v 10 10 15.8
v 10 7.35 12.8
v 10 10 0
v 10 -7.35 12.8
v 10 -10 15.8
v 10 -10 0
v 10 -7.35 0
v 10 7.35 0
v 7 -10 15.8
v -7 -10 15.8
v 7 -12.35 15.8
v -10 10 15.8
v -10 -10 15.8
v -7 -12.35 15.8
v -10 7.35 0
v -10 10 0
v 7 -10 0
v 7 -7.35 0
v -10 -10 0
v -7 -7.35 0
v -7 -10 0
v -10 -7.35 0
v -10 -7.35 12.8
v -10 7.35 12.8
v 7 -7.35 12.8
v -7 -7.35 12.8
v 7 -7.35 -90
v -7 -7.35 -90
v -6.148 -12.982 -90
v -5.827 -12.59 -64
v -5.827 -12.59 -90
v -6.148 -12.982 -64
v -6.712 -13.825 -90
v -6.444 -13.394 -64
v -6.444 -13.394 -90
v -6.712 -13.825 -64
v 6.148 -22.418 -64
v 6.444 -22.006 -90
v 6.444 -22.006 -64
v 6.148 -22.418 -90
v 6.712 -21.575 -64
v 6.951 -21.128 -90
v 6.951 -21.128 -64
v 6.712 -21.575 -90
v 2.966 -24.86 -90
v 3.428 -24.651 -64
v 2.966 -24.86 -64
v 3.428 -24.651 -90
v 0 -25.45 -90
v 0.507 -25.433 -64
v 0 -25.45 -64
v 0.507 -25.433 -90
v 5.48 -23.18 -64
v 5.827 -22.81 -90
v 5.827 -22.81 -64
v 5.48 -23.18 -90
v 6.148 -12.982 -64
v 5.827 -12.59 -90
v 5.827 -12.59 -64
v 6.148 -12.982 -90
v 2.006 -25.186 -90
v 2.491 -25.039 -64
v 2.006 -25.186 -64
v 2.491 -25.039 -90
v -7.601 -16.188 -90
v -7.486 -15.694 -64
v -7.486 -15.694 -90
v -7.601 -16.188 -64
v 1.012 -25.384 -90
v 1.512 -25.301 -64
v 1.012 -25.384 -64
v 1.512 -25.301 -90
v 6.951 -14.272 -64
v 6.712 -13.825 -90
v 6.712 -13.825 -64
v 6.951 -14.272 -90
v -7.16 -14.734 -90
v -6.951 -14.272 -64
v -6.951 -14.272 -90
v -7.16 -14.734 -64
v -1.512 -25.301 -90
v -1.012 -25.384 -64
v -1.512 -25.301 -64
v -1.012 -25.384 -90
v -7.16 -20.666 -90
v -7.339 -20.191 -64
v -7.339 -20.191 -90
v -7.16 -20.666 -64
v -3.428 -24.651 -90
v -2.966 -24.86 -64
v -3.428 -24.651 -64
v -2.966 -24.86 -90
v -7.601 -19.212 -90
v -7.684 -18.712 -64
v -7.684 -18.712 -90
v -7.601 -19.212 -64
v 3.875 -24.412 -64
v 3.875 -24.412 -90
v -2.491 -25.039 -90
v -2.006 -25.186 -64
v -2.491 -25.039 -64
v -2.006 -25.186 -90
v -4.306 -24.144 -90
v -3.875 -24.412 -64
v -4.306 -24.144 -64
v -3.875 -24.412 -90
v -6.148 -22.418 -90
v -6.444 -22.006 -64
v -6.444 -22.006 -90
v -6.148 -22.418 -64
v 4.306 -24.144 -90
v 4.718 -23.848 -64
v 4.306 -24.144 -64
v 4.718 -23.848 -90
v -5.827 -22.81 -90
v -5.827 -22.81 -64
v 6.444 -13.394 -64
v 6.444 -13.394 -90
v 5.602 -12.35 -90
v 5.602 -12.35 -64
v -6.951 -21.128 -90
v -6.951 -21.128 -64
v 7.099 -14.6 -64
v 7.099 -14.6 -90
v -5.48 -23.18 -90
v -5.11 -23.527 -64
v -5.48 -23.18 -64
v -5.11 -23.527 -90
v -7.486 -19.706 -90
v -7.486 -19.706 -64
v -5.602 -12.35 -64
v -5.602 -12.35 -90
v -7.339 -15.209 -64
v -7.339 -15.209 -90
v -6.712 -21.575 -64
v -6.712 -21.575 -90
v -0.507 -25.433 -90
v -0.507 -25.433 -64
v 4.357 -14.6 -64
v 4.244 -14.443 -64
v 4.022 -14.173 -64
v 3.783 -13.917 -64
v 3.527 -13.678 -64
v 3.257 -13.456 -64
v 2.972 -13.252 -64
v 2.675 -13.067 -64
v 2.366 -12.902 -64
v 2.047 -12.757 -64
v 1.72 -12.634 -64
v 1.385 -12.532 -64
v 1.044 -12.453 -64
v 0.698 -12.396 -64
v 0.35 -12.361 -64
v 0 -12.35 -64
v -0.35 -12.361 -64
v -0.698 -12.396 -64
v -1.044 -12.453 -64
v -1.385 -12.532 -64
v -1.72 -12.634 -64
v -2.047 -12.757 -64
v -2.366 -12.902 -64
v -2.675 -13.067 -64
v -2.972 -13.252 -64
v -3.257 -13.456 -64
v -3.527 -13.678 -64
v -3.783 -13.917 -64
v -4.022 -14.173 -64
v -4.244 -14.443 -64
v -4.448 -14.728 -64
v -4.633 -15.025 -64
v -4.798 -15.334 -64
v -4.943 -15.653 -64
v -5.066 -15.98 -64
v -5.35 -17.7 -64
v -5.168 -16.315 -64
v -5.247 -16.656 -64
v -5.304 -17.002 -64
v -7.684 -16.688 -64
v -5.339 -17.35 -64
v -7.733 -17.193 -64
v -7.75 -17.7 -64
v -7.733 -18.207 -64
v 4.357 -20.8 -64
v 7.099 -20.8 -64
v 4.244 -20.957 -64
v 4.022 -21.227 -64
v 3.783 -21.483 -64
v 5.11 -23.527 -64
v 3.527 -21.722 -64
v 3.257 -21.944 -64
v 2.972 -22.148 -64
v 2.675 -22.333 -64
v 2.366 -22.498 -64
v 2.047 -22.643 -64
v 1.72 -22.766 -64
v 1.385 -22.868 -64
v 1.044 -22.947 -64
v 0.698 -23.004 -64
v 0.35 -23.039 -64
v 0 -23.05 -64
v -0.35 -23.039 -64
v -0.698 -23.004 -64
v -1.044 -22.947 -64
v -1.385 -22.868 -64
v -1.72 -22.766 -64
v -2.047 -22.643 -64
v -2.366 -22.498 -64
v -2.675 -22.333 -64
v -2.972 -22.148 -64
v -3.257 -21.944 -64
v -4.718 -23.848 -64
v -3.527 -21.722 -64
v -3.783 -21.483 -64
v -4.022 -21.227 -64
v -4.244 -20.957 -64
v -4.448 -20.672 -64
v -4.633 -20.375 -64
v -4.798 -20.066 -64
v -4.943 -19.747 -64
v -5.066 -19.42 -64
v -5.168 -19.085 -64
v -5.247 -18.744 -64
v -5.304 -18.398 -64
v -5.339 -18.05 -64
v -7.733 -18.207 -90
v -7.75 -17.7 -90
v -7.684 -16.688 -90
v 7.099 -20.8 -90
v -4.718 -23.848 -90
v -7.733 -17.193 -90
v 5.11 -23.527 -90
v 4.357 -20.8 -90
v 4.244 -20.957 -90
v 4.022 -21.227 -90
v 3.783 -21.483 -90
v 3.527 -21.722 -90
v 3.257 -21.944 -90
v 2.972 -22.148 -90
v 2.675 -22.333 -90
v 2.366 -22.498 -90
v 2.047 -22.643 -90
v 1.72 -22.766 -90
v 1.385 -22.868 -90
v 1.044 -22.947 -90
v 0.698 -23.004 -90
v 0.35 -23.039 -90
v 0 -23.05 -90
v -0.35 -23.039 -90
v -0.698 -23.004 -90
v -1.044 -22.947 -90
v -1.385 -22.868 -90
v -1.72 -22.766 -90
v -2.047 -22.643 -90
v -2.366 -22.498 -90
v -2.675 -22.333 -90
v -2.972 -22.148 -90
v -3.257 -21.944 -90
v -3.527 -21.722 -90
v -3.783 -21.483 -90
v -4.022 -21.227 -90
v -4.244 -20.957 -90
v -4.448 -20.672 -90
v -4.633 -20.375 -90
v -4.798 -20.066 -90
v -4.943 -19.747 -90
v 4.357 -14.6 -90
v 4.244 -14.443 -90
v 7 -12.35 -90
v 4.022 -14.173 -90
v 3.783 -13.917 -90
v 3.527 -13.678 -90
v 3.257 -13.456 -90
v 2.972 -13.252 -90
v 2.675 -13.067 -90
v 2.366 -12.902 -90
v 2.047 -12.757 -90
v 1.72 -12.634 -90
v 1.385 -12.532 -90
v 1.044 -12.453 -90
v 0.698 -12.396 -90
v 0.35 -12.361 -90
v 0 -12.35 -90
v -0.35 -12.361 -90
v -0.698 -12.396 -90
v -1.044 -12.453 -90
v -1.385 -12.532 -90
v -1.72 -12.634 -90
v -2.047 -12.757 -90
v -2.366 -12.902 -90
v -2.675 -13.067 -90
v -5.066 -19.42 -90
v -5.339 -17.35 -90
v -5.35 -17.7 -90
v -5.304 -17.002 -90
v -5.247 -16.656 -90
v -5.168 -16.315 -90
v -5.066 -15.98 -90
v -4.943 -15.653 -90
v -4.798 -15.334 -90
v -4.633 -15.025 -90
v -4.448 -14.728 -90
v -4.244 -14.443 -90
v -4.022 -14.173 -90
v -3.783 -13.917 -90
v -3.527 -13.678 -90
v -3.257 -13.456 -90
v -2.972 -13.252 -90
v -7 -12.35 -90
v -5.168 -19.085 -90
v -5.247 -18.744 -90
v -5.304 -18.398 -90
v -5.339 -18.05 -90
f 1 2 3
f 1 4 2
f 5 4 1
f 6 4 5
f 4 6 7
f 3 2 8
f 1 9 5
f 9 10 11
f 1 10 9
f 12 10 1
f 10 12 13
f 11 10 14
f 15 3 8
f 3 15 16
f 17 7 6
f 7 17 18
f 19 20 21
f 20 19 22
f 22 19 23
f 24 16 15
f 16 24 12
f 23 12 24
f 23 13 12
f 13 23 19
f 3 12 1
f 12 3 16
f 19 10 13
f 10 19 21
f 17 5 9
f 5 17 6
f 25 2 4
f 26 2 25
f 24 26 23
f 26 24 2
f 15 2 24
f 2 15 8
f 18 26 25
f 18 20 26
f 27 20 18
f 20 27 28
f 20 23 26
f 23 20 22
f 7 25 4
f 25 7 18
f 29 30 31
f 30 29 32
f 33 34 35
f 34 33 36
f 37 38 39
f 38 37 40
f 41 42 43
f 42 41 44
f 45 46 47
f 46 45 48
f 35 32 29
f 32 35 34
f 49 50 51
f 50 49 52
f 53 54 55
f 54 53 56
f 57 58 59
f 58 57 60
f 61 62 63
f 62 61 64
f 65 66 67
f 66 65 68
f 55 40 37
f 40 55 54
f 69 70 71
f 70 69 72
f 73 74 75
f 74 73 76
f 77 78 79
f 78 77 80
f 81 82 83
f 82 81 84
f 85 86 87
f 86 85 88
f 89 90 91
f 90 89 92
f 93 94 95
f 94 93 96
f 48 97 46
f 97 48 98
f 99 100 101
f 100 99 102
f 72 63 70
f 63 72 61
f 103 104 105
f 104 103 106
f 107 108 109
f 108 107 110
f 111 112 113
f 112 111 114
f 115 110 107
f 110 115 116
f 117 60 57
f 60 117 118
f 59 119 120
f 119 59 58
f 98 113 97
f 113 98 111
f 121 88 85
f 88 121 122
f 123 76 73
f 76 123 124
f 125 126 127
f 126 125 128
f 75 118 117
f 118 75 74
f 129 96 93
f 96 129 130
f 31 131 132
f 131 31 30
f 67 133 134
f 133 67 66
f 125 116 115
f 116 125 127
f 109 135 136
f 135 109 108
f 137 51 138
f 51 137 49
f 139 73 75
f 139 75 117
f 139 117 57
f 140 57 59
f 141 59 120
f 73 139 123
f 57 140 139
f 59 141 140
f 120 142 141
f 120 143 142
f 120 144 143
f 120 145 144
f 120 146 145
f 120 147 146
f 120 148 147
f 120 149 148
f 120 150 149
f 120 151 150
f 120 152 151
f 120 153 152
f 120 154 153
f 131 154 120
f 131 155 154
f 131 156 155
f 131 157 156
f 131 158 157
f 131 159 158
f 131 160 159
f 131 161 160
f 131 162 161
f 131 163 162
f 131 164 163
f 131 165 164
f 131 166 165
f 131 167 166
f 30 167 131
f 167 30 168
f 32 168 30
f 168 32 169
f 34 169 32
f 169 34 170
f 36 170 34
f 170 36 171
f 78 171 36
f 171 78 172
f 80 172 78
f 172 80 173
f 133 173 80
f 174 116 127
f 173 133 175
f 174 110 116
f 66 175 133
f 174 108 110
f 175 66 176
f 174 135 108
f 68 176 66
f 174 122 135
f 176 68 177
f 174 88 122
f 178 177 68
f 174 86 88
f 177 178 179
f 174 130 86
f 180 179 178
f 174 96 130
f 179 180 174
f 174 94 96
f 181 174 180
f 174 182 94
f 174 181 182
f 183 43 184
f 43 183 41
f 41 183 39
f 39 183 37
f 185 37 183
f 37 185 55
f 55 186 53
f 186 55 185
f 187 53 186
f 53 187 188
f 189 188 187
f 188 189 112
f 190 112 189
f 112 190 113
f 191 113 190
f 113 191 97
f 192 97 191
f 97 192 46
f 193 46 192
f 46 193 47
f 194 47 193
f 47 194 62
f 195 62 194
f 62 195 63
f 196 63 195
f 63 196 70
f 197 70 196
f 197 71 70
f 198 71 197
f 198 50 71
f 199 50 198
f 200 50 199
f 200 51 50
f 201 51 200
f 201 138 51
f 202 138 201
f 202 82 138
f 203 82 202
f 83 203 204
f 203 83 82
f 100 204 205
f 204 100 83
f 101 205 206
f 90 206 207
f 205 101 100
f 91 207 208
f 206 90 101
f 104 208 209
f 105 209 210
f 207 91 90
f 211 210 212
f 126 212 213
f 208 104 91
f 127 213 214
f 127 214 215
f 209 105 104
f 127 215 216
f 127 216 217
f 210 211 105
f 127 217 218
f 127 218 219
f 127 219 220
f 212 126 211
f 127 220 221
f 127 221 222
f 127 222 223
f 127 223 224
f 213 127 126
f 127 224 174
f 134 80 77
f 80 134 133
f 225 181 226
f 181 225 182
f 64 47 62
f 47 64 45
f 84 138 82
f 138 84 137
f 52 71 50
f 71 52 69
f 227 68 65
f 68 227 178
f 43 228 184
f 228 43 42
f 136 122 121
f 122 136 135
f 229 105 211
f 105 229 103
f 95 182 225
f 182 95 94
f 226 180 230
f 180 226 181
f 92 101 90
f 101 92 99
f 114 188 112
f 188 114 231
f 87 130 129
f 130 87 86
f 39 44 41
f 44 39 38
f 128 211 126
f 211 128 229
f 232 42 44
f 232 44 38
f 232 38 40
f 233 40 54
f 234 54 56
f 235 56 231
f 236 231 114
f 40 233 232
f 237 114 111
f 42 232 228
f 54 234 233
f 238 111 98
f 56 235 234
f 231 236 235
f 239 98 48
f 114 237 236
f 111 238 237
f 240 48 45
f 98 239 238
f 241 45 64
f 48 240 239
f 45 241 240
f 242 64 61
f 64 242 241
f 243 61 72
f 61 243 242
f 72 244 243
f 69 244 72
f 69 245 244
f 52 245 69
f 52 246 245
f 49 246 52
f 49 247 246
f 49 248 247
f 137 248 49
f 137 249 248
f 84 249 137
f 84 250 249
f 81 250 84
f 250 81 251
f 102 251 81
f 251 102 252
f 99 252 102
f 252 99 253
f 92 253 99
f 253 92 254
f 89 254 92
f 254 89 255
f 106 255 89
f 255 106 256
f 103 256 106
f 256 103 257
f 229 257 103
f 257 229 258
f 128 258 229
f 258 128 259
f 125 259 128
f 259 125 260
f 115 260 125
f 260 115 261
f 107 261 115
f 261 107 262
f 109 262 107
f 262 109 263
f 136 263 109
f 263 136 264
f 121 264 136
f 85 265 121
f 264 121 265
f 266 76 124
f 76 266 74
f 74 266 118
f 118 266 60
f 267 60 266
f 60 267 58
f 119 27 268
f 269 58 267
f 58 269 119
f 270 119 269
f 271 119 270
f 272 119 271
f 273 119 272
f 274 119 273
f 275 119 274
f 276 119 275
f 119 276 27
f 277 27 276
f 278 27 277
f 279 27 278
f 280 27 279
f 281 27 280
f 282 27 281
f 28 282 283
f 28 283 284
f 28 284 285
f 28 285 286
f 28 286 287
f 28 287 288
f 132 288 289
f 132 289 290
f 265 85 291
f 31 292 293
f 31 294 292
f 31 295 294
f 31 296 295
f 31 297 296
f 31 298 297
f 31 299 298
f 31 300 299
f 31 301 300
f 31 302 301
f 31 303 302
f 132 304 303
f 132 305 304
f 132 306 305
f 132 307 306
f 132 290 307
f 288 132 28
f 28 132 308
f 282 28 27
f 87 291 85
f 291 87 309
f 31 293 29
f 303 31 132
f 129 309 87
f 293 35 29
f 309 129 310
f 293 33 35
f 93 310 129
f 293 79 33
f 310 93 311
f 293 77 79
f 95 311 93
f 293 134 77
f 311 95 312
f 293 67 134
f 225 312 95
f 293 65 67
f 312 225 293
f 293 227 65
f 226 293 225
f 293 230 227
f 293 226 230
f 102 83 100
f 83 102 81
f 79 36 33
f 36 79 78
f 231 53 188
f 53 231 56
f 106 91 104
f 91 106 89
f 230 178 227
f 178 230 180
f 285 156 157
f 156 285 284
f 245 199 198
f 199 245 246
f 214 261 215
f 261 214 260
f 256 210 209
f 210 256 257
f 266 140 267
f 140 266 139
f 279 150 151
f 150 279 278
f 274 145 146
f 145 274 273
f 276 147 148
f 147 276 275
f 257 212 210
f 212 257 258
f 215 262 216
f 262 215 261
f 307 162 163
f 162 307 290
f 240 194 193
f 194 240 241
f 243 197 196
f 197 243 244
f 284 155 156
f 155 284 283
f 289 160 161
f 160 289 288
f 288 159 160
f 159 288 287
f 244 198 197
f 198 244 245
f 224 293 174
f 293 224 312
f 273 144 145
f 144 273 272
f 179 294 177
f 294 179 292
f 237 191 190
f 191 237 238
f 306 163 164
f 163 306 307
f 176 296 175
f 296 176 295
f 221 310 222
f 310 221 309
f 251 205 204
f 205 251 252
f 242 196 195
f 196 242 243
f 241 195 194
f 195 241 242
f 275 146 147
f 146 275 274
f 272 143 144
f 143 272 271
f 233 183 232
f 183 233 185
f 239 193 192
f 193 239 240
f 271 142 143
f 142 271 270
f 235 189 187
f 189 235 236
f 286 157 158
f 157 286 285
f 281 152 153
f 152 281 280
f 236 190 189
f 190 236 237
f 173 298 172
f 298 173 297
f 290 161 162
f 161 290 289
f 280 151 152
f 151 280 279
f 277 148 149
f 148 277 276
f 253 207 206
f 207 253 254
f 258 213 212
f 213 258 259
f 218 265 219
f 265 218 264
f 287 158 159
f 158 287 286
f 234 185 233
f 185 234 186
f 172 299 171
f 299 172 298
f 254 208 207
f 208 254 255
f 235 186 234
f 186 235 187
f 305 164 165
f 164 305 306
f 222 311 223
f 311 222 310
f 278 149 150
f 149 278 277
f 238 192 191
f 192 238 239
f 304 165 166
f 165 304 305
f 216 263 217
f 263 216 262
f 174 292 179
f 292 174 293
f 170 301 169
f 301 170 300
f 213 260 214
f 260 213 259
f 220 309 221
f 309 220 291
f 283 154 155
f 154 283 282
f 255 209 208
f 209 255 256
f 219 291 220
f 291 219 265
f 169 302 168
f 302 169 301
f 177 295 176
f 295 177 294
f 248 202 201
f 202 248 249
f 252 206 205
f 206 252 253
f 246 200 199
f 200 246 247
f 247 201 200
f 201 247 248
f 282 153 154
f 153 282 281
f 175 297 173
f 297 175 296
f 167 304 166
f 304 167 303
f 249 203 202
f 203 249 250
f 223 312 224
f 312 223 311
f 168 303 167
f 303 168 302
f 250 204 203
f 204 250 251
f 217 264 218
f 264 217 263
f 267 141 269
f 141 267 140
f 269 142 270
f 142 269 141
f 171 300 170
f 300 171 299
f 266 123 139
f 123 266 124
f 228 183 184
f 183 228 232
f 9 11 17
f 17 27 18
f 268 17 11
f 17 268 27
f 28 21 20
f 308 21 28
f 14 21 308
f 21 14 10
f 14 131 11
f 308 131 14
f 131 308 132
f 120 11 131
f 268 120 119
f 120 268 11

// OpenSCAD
// file: common.scad
// common.scad — shared parameters for the aquarium grow-box parts.
// Everything downstream is driven from here. Measure YOUR tank, fan and lid
// with calipers and edit this file; do not trust the defaults.

$fn = 96;

/* ---------------- measured inputs ---------------- */
glass_t  = 6;      // tank wall glass thickness. 20-long / 29 gal is usually 5-6 mm.
rim_w    = 14;     // width of the plastic top trim, front to back
rim_h    = 16;     // height of the plastic top trim
lid_t    = 3;      // lid sheet thickness. 3 mm polycarbonate is the default.
duct_nom = 101.6;  // 4 in duct. Use 152.4 for a 6 in fan.
probe_d  = 10;     // sensor-probe body diameter
cable_d  = 6;      // fattest cable that must pass through the lid

/* ---------------- print fit ---------------- */
slop = 0.35;  // clearance per side on sliding fits
wall = 3;     // default wall thickness
eps  = 0.01;  // z-fighting guard

/* ---------------- helpers ---------------- */

// A ring of clearance holes, drilled from z=0 upward.
module bolt_ring(count, radius, hole_d, depth) {
    for (i = [0 : count - 1])
        rotate([0, 0, i * 360 / count])
            translate([radius, 0, -eps])
                cylinder(d = hole_d, h = depth + 2 * eps);
}

// Rounded rectangular plate centred on the origin, sitting on z=0.
module rounded_plate(x, y, z, r = 4) {
    hull()
        for (dx = [-1, 1], dy = [-1, 1])
            translate([dx * (x / 2 - r), dy * (y / 2 - r), 0])
                cylinder(r = r, h = z);
}

// Four corner clearance holes inset from the edges of an x by y plate.
module corner_holes(x, y, inset, hole_d, depth) {
    for (dx = [-1, 1], dy = [-1, 1])
        translate([dx * (x / 2 - inset), dy * (y / 2 - inset), -eps])
            cylinder(d = hole_d, h = depth + 2 * eps);
}

// Upside-down U that straddles the tank's top trim. Opening faces -z, length
// runs along x. -y is the tank interior, +y is the outside.
// `outer_foot` extends the outer wall down the outside glass: that is what
// stops a hanging load from levering the part off the rim. Put a strip of EVA
// foam between the foot and the glass.
// Each part that uses this picks its own print orientation; see the table in
// README.md rather than assuming one here.
module rim_saddle(len = 40, jaw = rim_w, depth = rim_h * 0.8, t = wall,
                  outer_foot = 0) {
    union() {
        difference() {
            translate([-len / 2, -(jaw / 2 + t), 0])
                cube([len, jaw + 2 * t, depth + t]);
            translate([-len / 2 - eps, -(jaw / 2 + slop), -eps])
                cube([len + 2 * eps, jaw + 2 * slop, depth + eps]);
        }
        if (outer_foot > 0)
            translate([-len / 2, jaw / 2 + slop, -outer_foot])
                cube([len, t - slop, outer_foot + eps]);
    }
}

// Height of the top face of a default rim_saddle.
saddle_top = rim_h * 0.8 + wall;

// Right-triangle brace: base `len` along +x, `height` along +z, `thick` in -y.
module gusset(len, height, thick) {
    rotate([90, 0, 0])
        linear_extrude(height = thick)
            polygon([[0, 0], [len, 0], [0, height]]);
}
// main file
// probe_clip.scad — holds the controller's temperature/humidity probe at
// canopy height instead of letting it dangle in the warmest air at the lid.
// Saddle grips the tank's top trim; the arm sets the height; the C-clip takes
// the probe body. Print on its side, flat back down: no bridging, no supports.

include <common.scad>

drop      = 90;                 // how far below the rim the probe sits
arm_t     = 5;
arm_w     = 14;
clip_id   = probe_d + 2 * slop;
clip_wall = 2.4;
clip_len  = 26;
clip_gap  = probe_d * 0.62;     // mouth width: snaps on, stays on

module c_clip() {
    difference() {
        cylinder(d = clip_id + 2 * clip_wall, h = clip_len);
        translate([0, 0, -eps])
            cylinder(d = clip_id, h = clip_len + 2 * eps);
        // mouth
        translate([0, -clip_gap / 2, -eps])
            cube([clip_id / 2 + clip_wall + eps, clip_gap, clip_len + 2 * eps]);
    }
}

module probe_clip() {
    union() {
        rim_saddle(len = arm_w + 2 * wall);
        // Arm hangs on the INSIDE face and starts outboard of the rim slot, so
        // the saddle can still seat on the trim.
        translate([-arm_w / 2, -(rim_w / 2 + slop + arm_t), -drop])
            cube([arm_w, arm_t, drop + saddle_top]);
        // Mouth faces +x: the probe snaps in from the side, clear of the arm.
        translate([0, -(rim_w / 2 + slop + arm_t + clip_id / 2), -drop])
            c_clip();
    }
}

probe_clip();
